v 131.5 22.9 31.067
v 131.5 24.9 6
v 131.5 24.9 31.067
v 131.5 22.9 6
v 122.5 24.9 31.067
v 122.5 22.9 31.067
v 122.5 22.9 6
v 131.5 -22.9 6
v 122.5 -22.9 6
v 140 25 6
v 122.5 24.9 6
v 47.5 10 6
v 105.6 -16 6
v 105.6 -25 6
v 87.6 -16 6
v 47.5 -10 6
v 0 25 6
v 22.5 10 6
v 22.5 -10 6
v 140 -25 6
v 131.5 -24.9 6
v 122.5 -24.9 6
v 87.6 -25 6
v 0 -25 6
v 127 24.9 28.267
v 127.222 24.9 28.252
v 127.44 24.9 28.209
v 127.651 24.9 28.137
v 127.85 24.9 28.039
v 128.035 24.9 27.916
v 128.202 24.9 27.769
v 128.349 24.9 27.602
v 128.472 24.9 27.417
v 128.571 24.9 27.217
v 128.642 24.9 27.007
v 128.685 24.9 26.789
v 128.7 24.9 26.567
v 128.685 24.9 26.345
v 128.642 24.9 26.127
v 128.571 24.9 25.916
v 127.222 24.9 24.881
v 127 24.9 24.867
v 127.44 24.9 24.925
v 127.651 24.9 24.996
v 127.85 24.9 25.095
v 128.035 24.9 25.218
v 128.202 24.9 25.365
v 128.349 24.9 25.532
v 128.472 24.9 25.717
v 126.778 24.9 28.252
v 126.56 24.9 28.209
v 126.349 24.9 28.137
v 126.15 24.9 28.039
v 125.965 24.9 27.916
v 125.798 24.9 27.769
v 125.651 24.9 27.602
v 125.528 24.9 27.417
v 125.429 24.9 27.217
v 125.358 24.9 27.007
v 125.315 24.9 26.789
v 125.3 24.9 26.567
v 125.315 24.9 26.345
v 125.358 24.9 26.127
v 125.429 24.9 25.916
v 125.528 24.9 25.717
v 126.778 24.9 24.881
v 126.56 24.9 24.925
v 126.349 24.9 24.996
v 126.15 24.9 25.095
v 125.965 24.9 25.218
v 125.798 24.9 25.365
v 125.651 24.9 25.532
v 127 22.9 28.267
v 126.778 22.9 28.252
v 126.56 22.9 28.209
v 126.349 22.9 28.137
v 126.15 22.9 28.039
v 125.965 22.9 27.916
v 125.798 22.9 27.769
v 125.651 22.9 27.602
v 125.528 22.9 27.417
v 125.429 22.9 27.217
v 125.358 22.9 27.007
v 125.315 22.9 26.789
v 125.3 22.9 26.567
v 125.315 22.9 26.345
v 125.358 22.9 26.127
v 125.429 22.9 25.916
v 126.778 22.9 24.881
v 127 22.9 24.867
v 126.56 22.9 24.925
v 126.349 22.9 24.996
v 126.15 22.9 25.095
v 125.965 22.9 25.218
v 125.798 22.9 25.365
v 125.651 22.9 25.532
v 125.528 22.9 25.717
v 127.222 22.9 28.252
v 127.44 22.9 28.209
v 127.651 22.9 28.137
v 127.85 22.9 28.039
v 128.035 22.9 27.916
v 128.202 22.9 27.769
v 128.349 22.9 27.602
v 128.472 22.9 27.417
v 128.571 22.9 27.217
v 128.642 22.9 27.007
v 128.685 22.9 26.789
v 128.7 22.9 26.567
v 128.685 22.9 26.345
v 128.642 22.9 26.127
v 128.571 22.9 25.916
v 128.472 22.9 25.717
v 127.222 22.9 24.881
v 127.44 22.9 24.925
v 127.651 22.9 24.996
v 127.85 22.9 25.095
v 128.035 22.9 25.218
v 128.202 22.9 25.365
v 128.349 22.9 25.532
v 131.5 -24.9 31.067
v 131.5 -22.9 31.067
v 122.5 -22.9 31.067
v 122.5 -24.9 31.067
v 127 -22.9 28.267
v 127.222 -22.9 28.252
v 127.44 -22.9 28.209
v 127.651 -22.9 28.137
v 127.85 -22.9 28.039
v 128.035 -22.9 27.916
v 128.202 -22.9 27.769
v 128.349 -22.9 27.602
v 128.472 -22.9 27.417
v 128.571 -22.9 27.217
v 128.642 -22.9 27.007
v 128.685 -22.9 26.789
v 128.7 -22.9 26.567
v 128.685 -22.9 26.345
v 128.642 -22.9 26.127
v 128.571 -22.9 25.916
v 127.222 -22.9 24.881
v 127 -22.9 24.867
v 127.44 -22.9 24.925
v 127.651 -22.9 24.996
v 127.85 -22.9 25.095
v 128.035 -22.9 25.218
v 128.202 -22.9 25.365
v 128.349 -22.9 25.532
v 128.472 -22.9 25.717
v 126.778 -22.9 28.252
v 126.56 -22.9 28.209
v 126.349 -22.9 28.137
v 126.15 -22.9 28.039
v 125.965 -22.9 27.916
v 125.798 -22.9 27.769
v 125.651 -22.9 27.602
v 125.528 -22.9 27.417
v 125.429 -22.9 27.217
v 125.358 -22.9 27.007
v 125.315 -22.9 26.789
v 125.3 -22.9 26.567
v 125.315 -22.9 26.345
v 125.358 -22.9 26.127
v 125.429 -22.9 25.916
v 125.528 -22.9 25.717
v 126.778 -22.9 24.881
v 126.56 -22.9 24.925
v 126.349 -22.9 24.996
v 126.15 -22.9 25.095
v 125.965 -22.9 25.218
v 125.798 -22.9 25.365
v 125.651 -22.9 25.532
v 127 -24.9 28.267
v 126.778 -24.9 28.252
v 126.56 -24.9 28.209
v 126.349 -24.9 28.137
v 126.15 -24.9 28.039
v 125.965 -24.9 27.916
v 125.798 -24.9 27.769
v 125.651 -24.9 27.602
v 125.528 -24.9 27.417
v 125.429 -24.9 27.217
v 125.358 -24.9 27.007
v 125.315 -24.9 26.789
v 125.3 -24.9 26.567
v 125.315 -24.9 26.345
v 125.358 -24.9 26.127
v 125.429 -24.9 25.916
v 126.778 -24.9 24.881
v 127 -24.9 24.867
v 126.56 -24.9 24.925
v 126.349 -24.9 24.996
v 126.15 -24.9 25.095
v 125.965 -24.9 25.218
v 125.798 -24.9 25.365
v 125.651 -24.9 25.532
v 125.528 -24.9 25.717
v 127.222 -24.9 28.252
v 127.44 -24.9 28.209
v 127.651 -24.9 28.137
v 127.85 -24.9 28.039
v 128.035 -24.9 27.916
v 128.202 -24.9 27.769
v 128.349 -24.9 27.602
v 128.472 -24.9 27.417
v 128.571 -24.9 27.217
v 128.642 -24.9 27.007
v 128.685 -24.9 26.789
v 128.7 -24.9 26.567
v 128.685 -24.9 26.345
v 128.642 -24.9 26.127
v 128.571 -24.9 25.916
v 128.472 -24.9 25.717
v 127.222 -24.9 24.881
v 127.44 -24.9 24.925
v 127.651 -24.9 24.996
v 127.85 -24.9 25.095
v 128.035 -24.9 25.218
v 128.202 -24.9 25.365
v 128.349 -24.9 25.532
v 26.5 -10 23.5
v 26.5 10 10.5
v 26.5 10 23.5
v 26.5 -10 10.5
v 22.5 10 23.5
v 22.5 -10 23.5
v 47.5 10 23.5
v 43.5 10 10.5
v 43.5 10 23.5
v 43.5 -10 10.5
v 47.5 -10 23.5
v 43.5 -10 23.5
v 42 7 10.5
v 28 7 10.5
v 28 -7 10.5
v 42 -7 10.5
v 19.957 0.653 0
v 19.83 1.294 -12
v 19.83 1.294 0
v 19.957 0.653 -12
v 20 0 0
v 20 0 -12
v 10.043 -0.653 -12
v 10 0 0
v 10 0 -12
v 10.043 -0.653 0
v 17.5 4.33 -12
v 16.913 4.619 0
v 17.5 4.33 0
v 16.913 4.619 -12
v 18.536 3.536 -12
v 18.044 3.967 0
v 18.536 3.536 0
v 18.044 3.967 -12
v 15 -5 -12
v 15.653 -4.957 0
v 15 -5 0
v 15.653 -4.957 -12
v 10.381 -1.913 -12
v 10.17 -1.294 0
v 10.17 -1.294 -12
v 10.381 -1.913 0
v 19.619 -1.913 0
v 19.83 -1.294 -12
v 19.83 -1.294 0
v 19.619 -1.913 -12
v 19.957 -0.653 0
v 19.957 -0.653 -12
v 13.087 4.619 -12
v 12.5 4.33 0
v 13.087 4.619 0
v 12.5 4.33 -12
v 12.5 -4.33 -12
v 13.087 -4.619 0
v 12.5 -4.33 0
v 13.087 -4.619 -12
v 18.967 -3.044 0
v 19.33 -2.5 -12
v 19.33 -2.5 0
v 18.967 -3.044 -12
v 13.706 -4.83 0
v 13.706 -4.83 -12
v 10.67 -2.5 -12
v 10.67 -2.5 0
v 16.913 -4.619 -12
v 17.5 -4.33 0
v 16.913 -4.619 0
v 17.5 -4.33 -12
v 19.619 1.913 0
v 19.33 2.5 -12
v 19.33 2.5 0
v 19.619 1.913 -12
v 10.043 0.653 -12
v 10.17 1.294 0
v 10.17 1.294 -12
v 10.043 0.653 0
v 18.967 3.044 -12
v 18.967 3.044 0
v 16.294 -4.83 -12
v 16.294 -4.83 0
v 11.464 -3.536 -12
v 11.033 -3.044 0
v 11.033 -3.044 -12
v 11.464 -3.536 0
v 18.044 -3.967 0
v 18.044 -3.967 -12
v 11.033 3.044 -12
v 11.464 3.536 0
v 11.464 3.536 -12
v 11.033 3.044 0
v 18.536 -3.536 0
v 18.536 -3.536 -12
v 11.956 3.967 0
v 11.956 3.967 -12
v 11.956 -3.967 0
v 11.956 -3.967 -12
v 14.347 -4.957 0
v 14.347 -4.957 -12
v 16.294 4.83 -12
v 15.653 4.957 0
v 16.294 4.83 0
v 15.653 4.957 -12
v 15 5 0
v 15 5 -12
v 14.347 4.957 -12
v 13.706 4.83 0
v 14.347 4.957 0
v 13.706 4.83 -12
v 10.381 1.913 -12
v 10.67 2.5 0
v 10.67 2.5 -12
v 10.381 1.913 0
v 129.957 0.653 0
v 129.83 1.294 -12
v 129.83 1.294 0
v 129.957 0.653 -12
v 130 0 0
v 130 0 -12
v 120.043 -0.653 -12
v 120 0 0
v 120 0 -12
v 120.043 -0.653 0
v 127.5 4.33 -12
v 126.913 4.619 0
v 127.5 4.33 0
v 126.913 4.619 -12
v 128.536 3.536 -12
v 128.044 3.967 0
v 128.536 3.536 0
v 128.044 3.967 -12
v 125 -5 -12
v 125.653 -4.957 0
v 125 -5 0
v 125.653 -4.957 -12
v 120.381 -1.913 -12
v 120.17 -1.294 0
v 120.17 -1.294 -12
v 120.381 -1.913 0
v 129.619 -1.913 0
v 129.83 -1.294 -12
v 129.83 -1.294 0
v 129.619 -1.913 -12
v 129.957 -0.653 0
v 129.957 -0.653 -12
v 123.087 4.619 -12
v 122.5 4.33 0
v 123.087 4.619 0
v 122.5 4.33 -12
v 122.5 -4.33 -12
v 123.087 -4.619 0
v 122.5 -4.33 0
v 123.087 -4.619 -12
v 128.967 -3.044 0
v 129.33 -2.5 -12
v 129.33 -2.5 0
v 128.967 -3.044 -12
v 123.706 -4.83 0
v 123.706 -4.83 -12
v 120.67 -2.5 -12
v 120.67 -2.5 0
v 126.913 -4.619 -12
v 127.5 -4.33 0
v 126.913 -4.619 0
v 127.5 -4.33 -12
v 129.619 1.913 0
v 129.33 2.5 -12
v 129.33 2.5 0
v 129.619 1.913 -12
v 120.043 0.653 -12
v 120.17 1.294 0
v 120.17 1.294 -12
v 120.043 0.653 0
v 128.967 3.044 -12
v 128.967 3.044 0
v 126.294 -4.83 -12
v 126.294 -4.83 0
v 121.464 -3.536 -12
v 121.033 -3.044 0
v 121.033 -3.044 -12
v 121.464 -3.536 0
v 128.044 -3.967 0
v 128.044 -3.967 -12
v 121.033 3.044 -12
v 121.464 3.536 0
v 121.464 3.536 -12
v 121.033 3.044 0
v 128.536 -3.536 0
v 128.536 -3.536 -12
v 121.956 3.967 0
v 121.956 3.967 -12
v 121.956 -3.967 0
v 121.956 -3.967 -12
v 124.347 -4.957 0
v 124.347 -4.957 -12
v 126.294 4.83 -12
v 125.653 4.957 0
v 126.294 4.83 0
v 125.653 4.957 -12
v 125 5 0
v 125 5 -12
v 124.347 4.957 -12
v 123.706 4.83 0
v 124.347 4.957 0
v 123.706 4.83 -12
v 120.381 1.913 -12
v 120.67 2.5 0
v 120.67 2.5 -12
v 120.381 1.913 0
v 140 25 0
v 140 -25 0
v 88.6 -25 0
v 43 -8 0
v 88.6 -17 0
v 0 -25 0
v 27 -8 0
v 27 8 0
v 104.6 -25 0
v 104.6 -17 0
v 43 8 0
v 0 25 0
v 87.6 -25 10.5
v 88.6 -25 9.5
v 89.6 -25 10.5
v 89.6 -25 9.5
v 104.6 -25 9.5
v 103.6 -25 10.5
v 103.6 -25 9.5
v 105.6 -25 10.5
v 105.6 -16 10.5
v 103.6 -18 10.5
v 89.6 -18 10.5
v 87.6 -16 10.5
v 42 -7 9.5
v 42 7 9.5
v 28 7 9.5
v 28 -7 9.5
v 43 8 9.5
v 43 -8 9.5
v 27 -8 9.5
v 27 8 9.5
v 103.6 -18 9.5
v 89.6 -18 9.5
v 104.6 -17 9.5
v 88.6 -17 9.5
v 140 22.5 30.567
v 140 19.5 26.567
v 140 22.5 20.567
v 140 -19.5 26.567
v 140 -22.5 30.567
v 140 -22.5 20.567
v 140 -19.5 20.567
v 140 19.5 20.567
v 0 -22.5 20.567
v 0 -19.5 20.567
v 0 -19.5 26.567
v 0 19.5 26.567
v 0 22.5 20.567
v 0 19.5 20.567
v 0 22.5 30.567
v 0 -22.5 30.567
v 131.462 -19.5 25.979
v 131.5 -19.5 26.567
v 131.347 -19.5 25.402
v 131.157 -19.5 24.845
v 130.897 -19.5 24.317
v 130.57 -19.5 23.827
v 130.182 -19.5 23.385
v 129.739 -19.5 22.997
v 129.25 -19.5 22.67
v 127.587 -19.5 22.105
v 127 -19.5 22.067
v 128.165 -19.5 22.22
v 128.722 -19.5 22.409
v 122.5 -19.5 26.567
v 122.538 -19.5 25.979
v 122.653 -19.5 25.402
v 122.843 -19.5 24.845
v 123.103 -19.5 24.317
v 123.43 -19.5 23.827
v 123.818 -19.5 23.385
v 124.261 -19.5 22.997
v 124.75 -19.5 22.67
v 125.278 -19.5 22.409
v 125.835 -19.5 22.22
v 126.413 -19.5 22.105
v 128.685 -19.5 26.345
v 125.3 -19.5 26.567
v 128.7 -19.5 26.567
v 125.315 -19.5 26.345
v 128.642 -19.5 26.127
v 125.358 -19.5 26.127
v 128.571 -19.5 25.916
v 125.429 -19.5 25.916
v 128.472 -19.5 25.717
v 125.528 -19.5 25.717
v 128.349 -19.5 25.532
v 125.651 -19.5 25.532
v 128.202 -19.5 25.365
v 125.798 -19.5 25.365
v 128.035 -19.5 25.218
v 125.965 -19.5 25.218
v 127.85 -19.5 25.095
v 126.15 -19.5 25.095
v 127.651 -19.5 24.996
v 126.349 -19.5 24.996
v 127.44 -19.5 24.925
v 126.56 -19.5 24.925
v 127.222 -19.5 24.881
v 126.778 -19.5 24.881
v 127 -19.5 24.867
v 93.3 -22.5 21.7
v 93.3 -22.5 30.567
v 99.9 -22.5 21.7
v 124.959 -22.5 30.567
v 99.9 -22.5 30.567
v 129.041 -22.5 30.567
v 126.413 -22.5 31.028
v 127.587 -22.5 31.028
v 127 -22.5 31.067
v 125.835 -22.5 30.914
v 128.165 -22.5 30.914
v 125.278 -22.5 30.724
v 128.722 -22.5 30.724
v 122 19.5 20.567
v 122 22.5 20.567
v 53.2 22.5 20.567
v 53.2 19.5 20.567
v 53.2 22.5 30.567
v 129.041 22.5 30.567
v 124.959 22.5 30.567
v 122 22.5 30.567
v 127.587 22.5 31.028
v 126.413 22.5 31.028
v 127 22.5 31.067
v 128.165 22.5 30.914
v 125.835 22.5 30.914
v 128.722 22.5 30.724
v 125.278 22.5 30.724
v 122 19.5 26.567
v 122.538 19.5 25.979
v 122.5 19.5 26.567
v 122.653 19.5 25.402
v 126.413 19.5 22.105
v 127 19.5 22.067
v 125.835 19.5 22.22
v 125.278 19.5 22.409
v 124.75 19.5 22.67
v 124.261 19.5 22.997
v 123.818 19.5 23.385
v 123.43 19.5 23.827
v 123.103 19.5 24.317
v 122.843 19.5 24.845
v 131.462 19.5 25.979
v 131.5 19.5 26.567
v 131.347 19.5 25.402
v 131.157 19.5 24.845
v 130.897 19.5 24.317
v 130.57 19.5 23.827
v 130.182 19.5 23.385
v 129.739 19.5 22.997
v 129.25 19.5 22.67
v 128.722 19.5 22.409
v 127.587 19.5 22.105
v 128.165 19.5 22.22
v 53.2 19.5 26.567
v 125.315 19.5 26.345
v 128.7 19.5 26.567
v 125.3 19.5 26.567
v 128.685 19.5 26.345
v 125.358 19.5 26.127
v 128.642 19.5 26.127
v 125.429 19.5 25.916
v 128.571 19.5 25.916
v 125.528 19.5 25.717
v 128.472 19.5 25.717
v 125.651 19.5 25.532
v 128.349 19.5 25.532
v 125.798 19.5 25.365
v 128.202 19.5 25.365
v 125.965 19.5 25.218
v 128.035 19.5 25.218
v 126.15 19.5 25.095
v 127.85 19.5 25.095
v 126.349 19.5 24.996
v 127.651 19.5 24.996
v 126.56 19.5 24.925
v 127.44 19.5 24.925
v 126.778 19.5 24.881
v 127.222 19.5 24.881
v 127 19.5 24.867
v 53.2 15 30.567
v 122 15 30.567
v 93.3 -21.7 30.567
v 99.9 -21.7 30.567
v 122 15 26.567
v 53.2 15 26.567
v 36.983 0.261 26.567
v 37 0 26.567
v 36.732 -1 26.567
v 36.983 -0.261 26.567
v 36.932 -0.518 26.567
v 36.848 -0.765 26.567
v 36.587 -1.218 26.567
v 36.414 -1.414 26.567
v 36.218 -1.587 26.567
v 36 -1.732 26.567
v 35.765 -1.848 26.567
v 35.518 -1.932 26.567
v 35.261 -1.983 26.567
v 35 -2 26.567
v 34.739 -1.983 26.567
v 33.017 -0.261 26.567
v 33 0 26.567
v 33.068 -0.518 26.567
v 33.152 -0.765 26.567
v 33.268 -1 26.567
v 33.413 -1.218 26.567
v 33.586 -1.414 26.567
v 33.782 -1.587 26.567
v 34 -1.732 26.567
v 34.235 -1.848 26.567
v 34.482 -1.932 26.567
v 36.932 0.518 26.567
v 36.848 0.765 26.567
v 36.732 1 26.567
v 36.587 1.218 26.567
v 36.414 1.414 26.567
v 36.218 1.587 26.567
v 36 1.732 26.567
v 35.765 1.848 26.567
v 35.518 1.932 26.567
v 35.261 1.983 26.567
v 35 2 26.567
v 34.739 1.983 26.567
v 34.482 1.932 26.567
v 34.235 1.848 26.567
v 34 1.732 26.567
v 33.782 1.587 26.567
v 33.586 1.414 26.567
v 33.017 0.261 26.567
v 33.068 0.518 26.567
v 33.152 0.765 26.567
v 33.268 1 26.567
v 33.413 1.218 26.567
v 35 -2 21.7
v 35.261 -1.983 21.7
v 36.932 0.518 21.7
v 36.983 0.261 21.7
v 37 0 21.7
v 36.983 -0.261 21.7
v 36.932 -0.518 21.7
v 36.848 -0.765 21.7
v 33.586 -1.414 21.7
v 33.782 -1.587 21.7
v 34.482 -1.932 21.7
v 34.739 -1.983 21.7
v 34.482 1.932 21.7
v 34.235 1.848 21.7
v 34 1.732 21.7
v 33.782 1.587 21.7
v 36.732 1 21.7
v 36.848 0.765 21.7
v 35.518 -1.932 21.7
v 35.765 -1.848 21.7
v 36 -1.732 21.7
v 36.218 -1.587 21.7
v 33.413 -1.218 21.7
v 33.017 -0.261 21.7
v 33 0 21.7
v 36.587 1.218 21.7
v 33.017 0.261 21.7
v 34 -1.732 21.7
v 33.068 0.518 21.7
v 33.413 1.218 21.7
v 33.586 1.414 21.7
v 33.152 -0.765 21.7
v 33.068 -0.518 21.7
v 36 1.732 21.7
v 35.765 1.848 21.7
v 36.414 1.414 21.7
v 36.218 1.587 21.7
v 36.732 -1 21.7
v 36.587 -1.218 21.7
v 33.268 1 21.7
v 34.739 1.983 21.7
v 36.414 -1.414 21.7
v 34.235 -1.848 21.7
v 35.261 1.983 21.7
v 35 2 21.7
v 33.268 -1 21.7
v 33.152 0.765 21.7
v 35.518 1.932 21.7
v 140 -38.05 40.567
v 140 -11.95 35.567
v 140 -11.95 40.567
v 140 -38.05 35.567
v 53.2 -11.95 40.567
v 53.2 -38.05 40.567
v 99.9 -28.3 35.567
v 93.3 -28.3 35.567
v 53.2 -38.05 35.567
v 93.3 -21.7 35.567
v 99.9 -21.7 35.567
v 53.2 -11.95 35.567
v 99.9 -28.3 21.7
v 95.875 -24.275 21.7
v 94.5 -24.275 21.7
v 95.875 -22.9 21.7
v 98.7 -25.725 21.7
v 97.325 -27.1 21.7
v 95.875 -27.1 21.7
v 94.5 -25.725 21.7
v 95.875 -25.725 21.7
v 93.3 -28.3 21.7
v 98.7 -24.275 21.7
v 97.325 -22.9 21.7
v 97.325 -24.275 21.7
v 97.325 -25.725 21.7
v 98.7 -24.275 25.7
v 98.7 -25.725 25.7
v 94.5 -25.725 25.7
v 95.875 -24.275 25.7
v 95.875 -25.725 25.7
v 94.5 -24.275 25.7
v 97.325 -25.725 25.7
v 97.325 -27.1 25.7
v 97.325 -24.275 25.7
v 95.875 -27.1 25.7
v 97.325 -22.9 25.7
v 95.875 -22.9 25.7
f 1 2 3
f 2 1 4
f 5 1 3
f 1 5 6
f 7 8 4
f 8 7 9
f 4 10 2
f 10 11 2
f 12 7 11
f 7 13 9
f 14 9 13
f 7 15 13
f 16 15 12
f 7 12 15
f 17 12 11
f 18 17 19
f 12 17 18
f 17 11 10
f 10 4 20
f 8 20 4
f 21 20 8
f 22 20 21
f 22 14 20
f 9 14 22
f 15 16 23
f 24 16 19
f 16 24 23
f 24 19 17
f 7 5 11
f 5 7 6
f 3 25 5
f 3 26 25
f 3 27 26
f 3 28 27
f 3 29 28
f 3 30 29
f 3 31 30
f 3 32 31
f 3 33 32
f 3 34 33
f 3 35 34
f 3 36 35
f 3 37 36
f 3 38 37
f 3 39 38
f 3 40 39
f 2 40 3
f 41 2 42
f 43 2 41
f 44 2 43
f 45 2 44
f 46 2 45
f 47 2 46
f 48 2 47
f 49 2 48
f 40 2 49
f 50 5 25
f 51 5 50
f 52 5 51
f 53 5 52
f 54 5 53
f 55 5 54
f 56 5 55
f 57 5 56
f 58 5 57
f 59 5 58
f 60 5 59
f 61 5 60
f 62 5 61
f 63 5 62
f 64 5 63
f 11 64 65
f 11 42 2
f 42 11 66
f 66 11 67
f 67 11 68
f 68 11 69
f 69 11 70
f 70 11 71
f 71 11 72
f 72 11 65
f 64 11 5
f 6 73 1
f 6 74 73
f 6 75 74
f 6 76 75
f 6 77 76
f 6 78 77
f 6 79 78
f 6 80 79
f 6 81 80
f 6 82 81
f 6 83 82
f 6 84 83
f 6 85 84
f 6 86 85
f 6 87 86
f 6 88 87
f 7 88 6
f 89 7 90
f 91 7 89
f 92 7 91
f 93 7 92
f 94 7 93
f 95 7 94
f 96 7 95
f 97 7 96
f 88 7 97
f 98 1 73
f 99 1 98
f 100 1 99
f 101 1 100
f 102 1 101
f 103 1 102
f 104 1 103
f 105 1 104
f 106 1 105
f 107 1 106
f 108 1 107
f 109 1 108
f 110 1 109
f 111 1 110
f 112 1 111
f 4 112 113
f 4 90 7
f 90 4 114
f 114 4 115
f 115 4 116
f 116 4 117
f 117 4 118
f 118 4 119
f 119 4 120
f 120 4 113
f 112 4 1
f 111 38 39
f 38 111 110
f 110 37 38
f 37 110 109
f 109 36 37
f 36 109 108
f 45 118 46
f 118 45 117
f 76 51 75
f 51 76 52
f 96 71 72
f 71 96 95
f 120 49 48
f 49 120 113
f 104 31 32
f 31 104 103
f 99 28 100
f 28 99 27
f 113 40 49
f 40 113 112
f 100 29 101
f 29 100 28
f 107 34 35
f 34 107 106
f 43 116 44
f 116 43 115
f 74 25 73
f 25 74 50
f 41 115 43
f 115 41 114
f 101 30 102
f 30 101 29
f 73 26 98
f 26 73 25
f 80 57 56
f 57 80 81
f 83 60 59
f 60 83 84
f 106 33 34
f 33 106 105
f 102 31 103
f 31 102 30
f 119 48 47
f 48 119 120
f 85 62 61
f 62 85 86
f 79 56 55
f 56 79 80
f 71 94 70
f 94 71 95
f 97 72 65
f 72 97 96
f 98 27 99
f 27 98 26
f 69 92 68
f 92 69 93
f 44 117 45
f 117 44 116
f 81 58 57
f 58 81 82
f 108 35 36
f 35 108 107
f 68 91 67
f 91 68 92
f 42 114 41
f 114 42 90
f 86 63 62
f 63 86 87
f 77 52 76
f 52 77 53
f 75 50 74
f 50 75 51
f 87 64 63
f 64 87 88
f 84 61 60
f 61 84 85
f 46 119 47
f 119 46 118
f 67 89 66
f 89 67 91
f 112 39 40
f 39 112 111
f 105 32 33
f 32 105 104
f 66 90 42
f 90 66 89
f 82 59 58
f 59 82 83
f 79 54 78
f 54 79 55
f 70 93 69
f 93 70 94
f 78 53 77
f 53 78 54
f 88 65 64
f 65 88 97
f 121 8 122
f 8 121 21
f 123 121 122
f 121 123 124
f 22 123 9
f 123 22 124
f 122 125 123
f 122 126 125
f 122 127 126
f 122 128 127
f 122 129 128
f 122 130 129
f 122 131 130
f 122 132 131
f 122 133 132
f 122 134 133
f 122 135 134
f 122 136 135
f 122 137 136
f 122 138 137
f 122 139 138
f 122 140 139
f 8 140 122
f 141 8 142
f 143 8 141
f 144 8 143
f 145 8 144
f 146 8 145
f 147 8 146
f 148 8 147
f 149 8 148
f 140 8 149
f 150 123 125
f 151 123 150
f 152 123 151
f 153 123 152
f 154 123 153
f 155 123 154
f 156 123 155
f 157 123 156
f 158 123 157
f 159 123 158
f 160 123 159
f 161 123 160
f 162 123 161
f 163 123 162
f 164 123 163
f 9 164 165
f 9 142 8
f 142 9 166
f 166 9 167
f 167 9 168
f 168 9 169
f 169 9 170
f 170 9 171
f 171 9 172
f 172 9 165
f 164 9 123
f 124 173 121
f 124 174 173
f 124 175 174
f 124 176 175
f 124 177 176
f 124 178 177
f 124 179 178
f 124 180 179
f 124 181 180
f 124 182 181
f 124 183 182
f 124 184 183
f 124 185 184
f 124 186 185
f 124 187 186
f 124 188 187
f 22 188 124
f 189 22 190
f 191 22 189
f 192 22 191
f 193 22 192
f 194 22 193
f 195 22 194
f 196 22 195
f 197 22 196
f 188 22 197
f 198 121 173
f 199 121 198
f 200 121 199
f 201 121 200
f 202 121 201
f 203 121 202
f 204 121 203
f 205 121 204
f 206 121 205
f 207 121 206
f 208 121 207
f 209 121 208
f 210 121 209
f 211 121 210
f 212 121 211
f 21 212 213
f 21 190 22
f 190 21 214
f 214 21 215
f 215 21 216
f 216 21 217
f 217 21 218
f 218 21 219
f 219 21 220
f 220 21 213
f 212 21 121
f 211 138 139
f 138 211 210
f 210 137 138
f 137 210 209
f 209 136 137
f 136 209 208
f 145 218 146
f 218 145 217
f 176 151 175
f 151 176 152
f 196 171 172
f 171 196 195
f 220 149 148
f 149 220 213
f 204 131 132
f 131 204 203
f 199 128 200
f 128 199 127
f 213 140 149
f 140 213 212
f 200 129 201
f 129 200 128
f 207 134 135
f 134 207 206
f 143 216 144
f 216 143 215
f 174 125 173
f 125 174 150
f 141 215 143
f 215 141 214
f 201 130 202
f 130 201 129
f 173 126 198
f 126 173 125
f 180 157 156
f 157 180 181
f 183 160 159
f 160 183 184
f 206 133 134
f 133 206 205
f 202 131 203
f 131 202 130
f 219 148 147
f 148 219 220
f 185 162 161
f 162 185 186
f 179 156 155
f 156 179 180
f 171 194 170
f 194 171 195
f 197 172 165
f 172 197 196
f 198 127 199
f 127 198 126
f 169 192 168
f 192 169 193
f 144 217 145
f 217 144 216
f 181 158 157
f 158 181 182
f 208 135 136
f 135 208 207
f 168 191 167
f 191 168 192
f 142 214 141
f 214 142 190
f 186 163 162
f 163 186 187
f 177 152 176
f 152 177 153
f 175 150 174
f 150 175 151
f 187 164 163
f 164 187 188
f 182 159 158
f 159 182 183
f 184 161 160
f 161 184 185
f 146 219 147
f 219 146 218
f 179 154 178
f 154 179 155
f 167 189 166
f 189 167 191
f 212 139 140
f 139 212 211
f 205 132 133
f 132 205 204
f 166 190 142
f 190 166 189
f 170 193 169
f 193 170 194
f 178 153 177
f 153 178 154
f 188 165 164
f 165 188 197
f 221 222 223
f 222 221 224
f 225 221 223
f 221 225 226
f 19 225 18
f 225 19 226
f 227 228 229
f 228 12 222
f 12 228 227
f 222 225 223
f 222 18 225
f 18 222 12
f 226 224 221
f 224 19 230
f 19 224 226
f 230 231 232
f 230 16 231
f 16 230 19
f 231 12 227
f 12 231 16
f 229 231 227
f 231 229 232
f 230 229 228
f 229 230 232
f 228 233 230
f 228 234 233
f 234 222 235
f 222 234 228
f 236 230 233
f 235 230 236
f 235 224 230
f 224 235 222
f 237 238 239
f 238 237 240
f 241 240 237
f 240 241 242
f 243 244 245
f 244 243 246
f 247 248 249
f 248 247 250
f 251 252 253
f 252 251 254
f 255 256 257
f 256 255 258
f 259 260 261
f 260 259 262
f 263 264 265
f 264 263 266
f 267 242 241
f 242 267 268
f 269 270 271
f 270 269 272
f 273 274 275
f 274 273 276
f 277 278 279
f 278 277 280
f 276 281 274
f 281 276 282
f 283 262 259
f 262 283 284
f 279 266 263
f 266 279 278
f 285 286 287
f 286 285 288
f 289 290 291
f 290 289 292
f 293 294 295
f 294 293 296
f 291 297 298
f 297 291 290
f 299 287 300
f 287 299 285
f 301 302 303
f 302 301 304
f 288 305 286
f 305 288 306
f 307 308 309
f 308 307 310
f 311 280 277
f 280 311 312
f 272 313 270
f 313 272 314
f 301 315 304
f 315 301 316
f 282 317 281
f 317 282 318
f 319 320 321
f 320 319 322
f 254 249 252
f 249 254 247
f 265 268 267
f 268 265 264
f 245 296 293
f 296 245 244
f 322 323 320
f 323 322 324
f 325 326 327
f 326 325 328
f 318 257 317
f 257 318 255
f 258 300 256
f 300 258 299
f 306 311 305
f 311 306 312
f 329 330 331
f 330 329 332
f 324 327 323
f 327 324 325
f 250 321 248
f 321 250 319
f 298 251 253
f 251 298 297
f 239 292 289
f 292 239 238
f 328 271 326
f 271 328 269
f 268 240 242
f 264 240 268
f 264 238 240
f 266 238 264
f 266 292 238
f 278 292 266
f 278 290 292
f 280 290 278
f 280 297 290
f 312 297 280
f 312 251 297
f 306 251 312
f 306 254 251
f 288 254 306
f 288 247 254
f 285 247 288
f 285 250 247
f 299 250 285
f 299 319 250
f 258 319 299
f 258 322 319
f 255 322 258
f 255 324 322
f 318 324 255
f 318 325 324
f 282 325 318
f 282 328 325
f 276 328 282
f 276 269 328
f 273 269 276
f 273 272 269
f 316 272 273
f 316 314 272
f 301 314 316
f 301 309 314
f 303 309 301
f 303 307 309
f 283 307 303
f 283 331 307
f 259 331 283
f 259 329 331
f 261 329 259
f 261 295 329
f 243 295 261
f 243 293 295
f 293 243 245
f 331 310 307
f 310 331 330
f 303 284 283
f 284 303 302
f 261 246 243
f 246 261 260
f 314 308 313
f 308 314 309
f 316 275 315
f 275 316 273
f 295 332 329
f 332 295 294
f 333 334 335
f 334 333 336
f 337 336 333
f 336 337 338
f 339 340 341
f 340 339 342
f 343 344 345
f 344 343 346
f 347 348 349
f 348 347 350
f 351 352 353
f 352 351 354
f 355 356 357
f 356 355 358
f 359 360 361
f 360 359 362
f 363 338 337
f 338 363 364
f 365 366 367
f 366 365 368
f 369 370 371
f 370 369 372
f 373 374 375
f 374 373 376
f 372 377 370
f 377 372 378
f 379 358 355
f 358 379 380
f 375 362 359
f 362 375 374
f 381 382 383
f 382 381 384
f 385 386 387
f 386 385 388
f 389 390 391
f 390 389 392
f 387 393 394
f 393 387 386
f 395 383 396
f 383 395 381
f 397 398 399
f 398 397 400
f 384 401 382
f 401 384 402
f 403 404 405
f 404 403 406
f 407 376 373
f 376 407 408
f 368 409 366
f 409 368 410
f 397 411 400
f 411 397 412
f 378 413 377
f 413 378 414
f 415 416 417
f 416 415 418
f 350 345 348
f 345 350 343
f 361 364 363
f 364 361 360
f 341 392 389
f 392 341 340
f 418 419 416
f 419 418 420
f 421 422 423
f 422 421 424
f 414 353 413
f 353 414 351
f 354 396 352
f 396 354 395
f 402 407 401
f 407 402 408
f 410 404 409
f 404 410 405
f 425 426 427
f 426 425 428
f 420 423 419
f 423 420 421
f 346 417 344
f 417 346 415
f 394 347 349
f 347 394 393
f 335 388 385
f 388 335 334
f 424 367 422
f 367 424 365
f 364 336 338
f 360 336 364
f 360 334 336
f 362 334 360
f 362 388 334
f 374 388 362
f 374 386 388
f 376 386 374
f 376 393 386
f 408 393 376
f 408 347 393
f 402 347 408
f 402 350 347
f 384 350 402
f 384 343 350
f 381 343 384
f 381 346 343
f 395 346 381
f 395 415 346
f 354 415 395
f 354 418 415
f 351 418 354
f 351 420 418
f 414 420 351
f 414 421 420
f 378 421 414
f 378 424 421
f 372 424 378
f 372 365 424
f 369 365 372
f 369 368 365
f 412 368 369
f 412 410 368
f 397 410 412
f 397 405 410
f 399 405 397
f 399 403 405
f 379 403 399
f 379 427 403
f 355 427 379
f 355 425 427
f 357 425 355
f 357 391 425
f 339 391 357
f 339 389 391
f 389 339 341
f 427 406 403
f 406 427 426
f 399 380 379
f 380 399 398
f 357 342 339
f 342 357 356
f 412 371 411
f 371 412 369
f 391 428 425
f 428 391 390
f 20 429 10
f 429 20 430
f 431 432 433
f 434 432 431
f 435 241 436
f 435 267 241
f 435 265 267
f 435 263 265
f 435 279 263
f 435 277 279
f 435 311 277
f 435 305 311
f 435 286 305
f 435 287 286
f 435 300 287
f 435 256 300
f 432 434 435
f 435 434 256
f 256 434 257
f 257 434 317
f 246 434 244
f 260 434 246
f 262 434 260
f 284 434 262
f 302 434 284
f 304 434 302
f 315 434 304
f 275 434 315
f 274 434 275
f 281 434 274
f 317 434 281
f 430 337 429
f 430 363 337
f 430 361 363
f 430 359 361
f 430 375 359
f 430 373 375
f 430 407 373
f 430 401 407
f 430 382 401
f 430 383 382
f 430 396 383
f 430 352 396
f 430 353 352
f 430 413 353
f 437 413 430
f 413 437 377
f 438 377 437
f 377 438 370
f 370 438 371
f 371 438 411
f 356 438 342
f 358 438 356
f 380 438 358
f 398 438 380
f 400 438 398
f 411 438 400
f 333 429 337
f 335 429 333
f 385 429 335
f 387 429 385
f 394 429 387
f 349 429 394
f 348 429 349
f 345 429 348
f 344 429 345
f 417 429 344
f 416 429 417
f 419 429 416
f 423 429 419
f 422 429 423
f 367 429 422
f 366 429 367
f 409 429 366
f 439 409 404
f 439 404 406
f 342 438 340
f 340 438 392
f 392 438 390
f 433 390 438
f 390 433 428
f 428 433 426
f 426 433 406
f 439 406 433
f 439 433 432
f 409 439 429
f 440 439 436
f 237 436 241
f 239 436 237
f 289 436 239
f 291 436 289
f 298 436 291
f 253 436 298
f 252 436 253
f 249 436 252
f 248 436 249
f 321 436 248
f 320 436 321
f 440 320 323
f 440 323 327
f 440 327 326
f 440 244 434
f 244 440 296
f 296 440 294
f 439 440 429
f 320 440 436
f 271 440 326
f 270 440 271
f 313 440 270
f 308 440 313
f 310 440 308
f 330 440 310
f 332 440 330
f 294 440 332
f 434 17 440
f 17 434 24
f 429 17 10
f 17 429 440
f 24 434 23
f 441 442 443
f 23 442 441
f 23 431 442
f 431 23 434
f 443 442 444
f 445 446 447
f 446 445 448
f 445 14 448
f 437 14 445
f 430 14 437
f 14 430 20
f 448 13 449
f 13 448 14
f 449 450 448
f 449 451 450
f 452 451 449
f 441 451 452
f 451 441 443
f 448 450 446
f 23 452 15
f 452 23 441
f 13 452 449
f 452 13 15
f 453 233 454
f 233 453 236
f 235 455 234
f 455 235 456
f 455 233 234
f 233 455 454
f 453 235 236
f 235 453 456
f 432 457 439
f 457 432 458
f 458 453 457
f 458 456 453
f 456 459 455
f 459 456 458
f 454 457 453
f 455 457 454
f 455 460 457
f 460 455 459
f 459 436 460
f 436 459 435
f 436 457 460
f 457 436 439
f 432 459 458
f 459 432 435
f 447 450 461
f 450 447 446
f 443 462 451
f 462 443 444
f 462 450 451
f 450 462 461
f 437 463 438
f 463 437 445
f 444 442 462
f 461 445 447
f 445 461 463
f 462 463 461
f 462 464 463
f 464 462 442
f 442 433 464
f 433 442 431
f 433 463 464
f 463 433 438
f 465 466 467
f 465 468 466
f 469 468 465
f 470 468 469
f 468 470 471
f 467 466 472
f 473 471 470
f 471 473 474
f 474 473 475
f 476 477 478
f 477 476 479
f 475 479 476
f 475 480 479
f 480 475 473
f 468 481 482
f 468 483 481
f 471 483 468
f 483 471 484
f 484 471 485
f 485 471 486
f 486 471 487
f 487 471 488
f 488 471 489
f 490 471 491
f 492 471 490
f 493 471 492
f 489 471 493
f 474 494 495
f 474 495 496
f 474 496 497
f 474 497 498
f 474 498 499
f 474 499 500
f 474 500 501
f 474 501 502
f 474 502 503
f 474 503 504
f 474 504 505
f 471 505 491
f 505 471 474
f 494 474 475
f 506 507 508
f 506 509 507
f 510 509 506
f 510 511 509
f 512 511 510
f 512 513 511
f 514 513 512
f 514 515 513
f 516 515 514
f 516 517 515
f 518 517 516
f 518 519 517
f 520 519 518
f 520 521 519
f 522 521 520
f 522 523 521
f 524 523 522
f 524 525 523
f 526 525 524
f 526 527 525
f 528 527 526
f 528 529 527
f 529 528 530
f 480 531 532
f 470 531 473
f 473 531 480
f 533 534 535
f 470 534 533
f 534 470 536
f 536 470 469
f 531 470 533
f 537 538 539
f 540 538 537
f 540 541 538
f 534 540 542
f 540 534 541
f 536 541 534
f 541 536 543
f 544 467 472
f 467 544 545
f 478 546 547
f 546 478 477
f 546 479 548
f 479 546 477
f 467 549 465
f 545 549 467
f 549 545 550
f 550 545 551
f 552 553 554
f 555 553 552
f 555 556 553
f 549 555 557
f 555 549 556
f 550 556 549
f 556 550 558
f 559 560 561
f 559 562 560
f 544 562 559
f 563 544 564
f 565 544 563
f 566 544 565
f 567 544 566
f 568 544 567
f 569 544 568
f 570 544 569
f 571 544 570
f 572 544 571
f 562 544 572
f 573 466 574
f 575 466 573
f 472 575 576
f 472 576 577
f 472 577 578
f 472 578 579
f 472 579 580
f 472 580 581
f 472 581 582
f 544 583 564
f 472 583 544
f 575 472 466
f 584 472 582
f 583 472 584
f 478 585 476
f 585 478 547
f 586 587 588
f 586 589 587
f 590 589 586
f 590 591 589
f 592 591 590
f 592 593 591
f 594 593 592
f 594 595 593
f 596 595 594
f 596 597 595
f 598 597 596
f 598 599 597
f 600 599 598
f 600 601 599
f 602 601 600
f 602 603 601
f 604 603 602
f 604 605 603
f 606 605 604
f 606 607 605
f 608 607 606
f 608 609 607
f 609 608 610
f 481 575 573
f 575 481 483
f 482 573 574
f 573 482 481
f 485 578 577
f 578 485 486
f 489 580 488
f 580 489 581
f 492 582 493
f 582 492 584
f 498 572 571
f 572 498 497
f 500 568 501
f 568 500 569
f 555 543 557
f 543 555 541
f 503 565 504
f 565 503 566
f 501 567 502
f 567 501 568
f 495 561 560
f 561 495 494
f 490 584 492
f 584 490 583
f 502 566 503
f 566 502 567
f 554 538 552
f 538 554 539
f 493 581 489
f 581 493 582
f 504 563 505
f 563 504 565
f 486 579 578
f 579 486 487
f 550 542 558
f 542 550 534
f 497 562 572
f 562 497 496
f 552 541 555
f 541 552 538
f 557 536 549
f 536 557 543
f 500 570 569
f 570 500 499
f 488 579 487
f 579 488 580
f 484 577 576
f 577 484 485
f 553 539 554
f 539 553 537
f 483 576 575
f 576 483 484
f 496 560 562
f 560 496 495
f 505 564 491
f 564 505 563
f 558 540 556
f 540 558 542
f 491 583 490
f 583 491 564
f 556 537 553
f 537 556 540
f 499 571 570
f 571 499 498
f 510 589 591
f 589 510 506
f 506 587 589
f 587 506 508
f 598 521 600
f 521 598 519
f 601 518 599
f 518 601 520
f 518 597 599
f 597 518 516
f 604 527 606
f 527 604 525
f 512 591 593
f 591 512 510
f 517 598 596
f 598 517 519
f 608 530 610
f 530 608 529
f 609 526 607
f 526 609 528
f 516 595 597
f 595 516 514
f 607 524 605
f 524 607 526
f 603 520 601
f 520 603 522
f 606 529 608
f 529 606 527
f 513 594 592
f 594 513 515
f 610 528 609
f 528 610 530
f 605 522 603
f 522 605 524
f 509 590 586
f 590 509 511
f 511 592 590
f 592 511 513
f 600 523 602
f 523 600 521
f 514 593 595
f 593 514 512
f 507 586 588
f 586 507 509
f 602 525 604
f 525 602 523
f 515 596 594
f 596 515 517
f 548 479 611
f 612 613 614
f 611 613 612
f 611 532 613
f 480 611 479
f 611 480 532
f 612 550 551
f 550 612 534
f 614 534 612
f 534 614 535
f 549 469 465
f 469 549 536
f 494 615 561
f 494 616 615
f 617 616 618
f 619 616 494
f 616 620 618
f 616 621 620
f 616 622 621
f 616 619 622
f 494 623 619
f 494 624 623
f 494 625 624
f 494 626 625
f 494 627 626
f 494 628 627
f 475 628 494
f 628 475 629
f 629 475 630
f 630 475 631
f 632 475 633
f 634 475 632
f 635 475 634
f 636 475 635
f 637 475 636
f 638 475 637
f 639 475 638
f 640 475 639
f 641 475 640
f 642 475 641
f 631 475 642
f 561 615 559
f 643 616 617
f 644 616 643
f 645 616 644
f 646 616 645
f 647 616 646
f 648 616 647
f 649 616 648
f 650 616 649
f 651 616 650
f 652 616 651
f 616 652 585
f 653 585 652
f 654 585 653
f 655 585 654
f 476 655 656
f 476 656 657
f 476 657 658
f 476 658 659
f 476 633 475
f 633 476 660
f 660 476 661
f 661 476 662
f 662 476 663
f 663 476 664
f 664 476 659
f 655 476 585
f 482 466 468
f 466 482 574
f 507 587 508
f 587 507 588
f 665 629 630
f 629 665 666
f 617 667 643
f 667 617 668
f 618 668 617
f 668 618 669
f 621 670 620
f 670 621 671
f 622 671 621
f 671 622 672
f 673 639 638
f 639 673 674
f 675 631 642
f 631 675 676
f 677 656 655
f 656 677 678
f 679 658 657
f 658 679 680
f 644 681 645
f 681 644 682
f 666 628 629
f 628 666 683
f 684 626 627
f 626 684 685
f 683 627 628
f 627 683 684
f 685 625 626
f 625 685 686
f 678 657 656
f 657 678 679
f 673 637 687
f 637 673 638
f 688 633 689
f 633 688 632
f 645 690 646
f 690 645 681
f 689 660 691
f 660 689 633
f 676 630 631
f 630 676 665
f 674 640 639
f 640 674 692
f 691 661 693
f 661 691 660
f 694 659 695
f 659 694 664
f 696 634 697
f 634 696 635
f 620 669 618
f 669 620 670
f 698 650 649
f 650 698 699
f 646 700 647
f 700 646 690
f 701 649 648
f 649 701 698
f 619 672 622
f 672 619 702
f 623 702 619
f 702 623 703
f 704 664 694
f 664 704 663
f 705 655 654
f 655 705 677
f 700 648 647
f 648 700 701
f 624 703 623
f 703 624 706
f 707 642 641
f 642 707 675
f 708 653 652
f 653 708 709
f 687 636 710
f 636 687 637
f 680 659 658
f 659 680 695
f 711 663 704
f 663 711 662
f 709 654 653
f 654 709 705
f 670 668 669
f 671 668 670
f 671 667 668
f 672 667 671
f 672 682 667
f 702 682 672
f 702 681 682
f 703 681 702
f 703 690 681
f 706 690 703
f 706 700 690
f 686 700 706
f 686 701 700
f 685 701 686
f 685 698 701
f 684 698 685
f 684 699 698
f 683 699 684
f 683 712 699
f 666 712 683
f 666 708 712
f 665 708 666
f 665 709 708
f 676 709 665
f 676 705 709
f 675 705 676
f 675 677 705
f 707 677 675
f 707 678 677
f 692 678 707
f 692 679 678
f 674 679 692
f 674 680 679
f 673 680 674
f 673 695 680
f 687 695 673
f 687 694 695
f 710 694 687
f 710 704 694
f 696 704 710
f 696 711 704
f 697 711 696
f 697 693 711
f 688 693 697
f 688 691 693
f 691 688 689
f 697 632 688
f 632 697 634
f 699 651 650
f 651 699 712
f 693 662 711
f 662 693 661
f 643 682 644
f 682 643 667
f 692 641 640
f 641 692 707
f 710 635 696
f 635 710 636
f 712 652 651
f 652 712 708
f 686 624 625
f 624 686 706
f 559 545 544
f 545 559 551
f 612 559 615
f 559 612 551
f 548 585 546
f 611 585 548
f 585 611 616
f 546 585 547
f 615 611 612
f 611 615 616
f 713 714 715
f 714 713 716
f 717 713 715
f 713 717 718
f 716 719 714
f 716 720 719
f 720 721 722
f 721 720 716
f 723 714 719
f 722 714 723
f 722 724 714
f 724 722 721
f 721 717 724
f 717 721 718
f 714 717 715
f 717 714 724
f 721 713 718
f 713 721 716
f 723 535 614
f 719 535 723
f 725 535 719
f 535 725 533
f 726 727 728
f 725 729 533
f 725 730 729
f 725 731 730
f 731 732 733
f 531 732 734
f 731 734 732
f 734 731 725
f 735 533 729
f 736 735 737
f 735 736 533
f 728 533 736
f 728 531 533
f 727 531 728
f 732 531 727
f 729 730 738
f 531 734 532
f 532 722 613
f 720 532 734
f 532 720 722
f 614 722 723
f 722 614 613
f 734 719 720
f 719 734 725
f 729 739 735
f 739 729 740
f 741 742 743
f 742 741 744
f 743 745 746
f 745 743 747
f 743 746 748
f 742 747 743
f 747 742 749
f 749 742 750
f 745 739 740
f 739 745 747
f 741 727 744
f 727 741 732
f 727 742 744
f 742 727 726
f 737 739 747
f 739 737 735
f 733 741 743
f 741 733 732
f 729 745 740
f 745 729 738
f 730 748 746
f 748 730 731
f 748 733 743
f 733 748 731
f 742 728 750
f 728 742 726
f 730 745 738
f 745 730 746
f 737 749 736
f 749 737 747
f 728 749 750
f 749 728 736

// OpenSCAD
// file: piano_keys.scad
// =====================================================================
// piano_keys.scad — the moving parts, PRINTED IN BOTH ROUTES
// =====================================================================
// Everything in this file is 3D printed and is needed whichever base you
// build. Nothing here is laser-cut.
//
//   mode "key"    key lever  x11
//   mode "black"  black key  x7
//
// The base comes from ONE of:
//   piano_base_printed.scad   all-printed route
//   piano_base_laser.scad     laser-cut route
//
// Shared dimensions live in piano_params.scad — edit them there.
// See ../TECHSPARK_PLAN.md for the full parts manifest.
//
// MECHANISM (side view, front = left):
//
//        finger presses here (contact_x)
//                |
//   ___________  v  ______________________ () <- rear pin hinge
//  |  key cap (lever, pivots at rear)      |
//  |______________________________________|
//                |plunger|
//                v
//             [MX switch] <- its own spring holds the key up and returns it
//  ============= base ====================
//
// The key RESTS on the switch stem. The finger drives the cap down; the stem
// actuates, and shortly after the cap lands on the base's stop shoulders.
// Those shoulders — not the switch — absorb the 362-520 gf overshoot.
// There is NO separate return spring and no up-stop: the MX spring does both.
//
// COORDINATES: x along the key (0 = front, +x = rear/hinge); y across the
// width (0 = centre); z up (0 = board underside).
// =====================================================================

include <piano_params.scad>

$fn = 48;

// =====================================================================
// Key lever (the moving key cap). Printing it upside-down is easiest.
// =====================================================================
// `idx` is the white-key index 0..10. It decides which sides get notched to
// clear the neighbouring black keys' switches. Pass -1 for an un-notched key.
module key_lever(idx = -1) {
    difference() {
        union() {
            // top plate
            translate([0, -key_w/2, under_rest]) cube([key_len, key_w, cap_th]);
            // side rails (cosmetic skirts) — INSIDE the key width so they clear
            // the hinge posts and the neighbouring key
            for (s = [-1, 1])
                translate([0, (s > 0) ? (key_w/2 - side_rail) : -key_w/2, under_rest - 6])
                    cube([key_len, side_rail, 6 + 0.1]);
            // rear hinge knuckle, centred in y, pin axis along Y
            translate([pivot_x, 0, pivot_z]) knuckle();
            // plunger at contact_x: presses the MX stem (no spring — MX returns it)
            translate([contact_x, 0, 0]) plunger();
        }
        // Notch the rear of the key wherever a black key sits beside it, so its
        // switch has room. Real piano white keys are shaped the same way, and
        // for the same reason. The notch stops at blk_notch_x1 so the hinge
        // knuckle keeps its full width.
        if (is_black(idx))     notch( 1);
        if (is_black(idx - 1)) notch(-1);
    }
}

module notch(side) {
    y0 = (side > 0) ? (key_w/2 - blk_notch) : -(key_w/2);
    translate([blk_notch_x0, y0, under_rest - 8])
        cube([blk_notch_x1 - blk_notch_x0, blk_notch, cap_th + 10]);
}

// Hinge knuckle. Origin is the PIN CENTRE, so it is called with
// translate([pivot_x, 0, pivot_z]). A bar lying along Y with the pin bore
// through it, merging into the cap above. It does NOT reach down to the base —
// the key has to swing freely. Its width (knuckle_wid) is what stops the key
// sliding sideways along the pin.
module knuckle() {
    difference() {
        translate([0, -knuckle_wid/2, 0])
            rotate([-90, 0, 0]) cylinder(h = knuckle_wid, d = knuckle_boss_d);
        translate([0, -knuckle_wid/2 - 1, 0])
            rotate([-90, 0, 0]) cylinder(h = knuckle_wid + 2, d = pin_d);
    }
}

module plunger() {
    // Stubby post hanging from the cap underside that pushes the MX stem down.
    // It passes between the base's stop shoulders; the CAP UNDERSIDE is what
    // lands on them, so the switch never takes the overshoot.
    tip_d = 4;
    translate([0, 0, under_rest - plunger_len])
        cylinder(h = plunger_len, d = tip_d);
}

// =====================================================================
// Black key (decorative riser, no switch). Sits at a white-key boundary:
// a thin web drops into the base's slot/groove and is glued; the cap
// overhangs both neighbouring white keys, black_rise above their tops.
// White keys only travel DOWN, so the overhang never collides.
// Print flat on its side for strength along the web.
// =====================================================================
// A SWITCHED black key: a keycap on a post that pushes straight onto an MX
// stem, exactly like a keyboard keycap. No hinge, no glue, no return spring —
// the switch supplies the travel and the spring.
//
// It travels straight down while the white keys pivot. Slightly different feel,
// but the black keys are never pressed by the robot, and a lever here would
// collide with the hinge brackets that share the same 5 mm gap.
module black_key() {
    cap_under = black_top_z - blk_cap_th;
    post_w    = mx_mount_cross + 2.4;      // socket plus wall
    difference() {
        union() {
            // cap
            translate([key_len - black_len, -black_w/2, cap_under])
                cube([black_len, black_w, blk_cap_th]);
            // post down to the switch stem, centred on blk_switch_x
            translate([blk_switch_x - post_w/2, -post_w/2, stem_top_z])
                cube([post_w, post_w, cap_under - stem_top_z + 0.1]);
        }
        // MX cross socket in the underside of the post
        translate([blk_switch_x, 0, stem_top_z - 0.1]) mx_mount();
    }
}

// The + shaped recess an MX stem plugs into.
module mx_mount() {
    for (r = [0, 90])
        rotate([0, 0, r])
            translate([-mx_mount_cross/2, -mx_mount_th/2, 0])
                cube([mx_mount_cross, mx_mount_th, mx_mount_depth + 0.1]);
}

// =====================================================================
// Render selector
// =====================================================================
// "key"    one key lever   (print 11)
// "black"  one black key   (print 7)
// "pair"   both together, to check the black key clears the white key
mode = "pair";

if      (mode == "key")   key_lever();
else if (mode == "black") black_key();
else if (mode == "pair") {
    color("white") key_lever();
    color("black") translate([0, pitch/2, 0]) black_key();
}
// main file
// =====================================================================
// piano_base_printed.scad — the ALL-PRINTED route for the keybed base
// =====================================================================
// One of two alternative bases. Everything here is 3D printed.
//
//   mode "base"   one 50 mm base cell
//   mode "tile"   one printable tile (set tile_i = 0/1/2)  -> print all 3
//   mode "full"   the whole 11-key board, VISUAL CHECK ONLY (too big to print)
//
// You ALSO need the key levers and black keys from piano_keys.scad — they are
// printed in both routes and are not duplicated here.
//
// BUILD VOLUME: TechSpark's printers are 10 x 10 x 10 in (254 mm) but the board
// is 545 mm wide, so the base must be split into 3 tiles (5 + 4 + 2 cells) and
// joined. The 50 mm key pitch therefore has to survive two seams — which is the
// main argument for the laser route in piano_base_laser.scad, where all 11
// switch holes are cut in one operation on one sheet.
//
// Shared dimensions live in piano_params.scad. See ../TECHSPARK_PLAN.md.
// =====================================================================

include <piano_params.scad>
use     <piano_keys.scad>      // key_lever() / black_key() for the preview modes

$fn = 48;

// =====================================================================
// Tiling — where the board is cut for the 254 mm print bed
// =====================================================================
// The 11 cells are printed as 3 tiles. WHICH cells each tile holds is not
// arbitrary: a seam must not fall on a black-key boundary, because the black
// key's switch socket straddles the boundary and would end up half on each
// tile, with the glue joint running straight through the 14 mm mounting hole
// that the MX clips grip.
//
// Black keys sit at boundaries after cells [0, 2, 3, 5, 6, 7, 9], so the only
// seam-safe boundaries are after cells 1, 4, 8 and 10. With a 5-cell (250 mm)
// tile limit, "after 4" and "after 8" is the ONLY 3-way split that works:
//
//   tile 0 -> cells 0..4   (5 cells, 250 mm)
//   tile 1 -> cells 5..8   (4 cells, 200 mm)
//   tile 2 -> cells 9..10  (2 cells, 100 mm)
//
// The previous 5 + 5 + 1 split put a seam after cell 9, which IS a black-key
// boundary.
tile_first = [0, 5, 9];              // first cell index of each tile
tile_last  = [4, 8, 10];             // last  cell index of each tile
seam_after = [4, 8];                 // a seam falls between cell s and s+1

// Feet live on the FIRST and LAST cell of each tile, so every tile stands on
// its own on the bench before the three are joined, and the finished board is
// supported at both ends of each span. Every cell used to carry a pair — 22
// feet on a 545 mm board, one every 25 mm, which is far more support than a
// plate this short needs and a lot of extra print time.
foot_cells = concat(tile_first, tile_last);   // 12 feet, was 22

function in_list(v, L) = len([for (e = L) if (e == v) 1]) > 0;

// =====================================================================
// Base cell (one 50 mm-wide slice of keybed). Tile in -y (see slot_y).
// =====================================================================
// `idx` is the white-key index (0..10) this cell holds. It decides which of the
// cell's two edges carries half of a black key's switch socket, whether the
// cell gets feet, and whether its edges are at a tile seam. Pass -1 for a plain
// cell with no black-key features.
//
// SIDE CONVENTION: slot_y() DECREASES with the index, so cell idx+1 is the -y
// neighbour of cell idx. is_black(idx) — the boundary between idx and idx+1 —
// is therefore at -pitch/2, and is_black(idx-1) is at +pitch/2. These were
// swapped, which put every black key's switch socket one boundary off.
//
// STRUCTURE: every subtraction happens in the ONE difference() below, and the
// modules in the union() are solid. mx_socket() and black_socket() used to
// carry their own nested difference(), which made the CSG tree needlessly deep
// and scattered the cuts across three places. (The reason the switch holes
// previewed as solid floors is in switch_cuts() — coincident cut faces, not
// the nesting — but keeping the cuts together is what makes that easy to see.)
module base_cell(idx = -1) {
    difference() {
        union() {
            translate([0, -pitch/2, 0]) cube([key_len, pitch, base_th]);
            hinge_post(1);
            hinge_post(-1);
            translate([contact_x, 0, base_th]) mx_boss();
            // Half of each neighbouring black key's switch boss. Clipped to
            // this cell so a tile edge stays flat: the other half is grown by
            // the neighbouring cell, and two butted cells form the whole boss.
            if (is_black(idx))      black_half_boss(-1);
            if (is_black(idx - 1))  black_half_boss( 1);
            if (in_list(idx, foot_cells)) cell_feet();
        }
        // ---- white key switch -------------------------------------------
        // The plate cutout, the clip relief under it, and a clearance hole
        // right THROUGH the base: the switch body and pins hang
        // mx_below_plate (6.4 mm) under the plate, more than fits inside the
        // riser. The pins end up in free air, the wires are soldered from
        // underneath, and the harness runs out to the Arduino in the space
        // the feet create.
        translate([contact_x, 0, base_th]) mx_cuts();
        // ---- black key switches -----------------------------------------
        // Switched, not decorative, so each needs the same cavity as a white
        // key rather than a groove to be glued into. Half falls in each
        // neighbouring cell.
        if (is_black(idx))      translate([0, -pitch/2, base_th]) black_cuts();
        if (is_black(idx - 1))  translate([0,  pitch/2, base_th]) black_cuts();
        // ---- tile registration ------------------------------------------
        if (in_list(idx,     seam_after)) translate([0, -pitch/2, 0]) dowel_holes();
        if (in_list(idx - 1, seam_after)) translate([0,  pitch/2, 0]) dowel_holes();
    }
}

// Integral feet, one pair per cell that carries them (see foot_cells). They
// lift the board by foot_h so the switch pins (which hang mx_below_plate under
// the plate) clear the desk and the wiring harness has somewhere to run.
// Printed as part of the cell — no standoffs to buy and nothing to align.
module cell_feet() {
    for (x = [15, 125])
        translate([x, 0, -foot_h]) cylinder(h = foot_h + 0.1, d = 10);
}

// Half-holes on a cell edge, cut ONLY where a tile seam falls (seam_after).
// The two halves form one bore across the joint, and a length of the same 3 mm
// rod used for the hinge pins registers the tiles to each other.
//
// This matters specifically for the printed route: the board is split into 3
// tiles for the 254 mm print bed, so the 50 mm key pitch — the thing the arm
// is calibrated to — has to survive two joins. Butting the tiles by eye would
// put that at risk; a dowel makes the joint repeatable.
//
// They used to be cut on EVERY cell edge, which put 44 blind holes through the
// base plate, 40 of them inside a tile where there is no joint to register and
// nothing to put in them.
module dowel_holes() {
    // x positions clear of the switch cavity (25-45), the black key socket
    // (87.6-105.6) and the hinge posts (122.5-131.5)
    for (x = [12, 137])
        translate([x, 0, -1]) cylinder(h = base_th + 2, d = pin_d);
}

// Physical y of key index i. Mirrored so key 0 lands at HIGH y, which is the
// viewer's LEFT when standing at the front — matching how the simulator draws
// it. See the orientation note at the top of piano_params.scad.
function slot_y(i) = (n_keys - 1 - i) * pitch;

// ---------------------------------------------------------------------
// Black key switch. SOLID and CUT are separate modules so base_cell() can do
// all of its subtraction at one level — see the note on base_cell().
// ---------------------------------------------------------------------
// blk_boss is 18 mm, not the white keys' 20 mm: it has to fit between the two
// notched white keys either side of it. A notched key edge sits
// key_w/2 - blk_notch = 15 mm from the cell centre, i.e. 10 mm from the
// boundary the boss is centred on, so a half-boss of 9 mm leaves 1 mm of
// clearance per side. At the old 19 mm that was only 0.5 mm, which print
// tolerance alone could close.
blk_boss = mx_cut + 2*2;    // 18

// Half of a black key's boss — the half lying inside THIS cell.
// side = -1 for the boss on the cell's -y edge, +1 for the +y edge.
module black_half_boss(side) {
    y0 = (side > 0) ? (pitch/2 - blk_boss/2) : -pitch/2;
    translate([blk_switch_x - blk_boss/2, y0, base_th])
        cube([blk_boss, blk_boss/2, mx_riser_h]);
}

// Everything removed at a black key switch. Same 14 mm plate cutout as the
// white keys, but NO stop shoulders: black keys are hand-pressed, so bottoming
// out on the switch is ordinary keyboard use. Origin on the key boundary at
// the TOP OF THE BASE PLATE, so it is called translated to (0, +/-pitch/2,
// base_th) — the same frame mx_cuts() uses.
module black_cuts() { switch_cuts(blk_switch_x); }

// The cut stack shared by every switch position, in TWO tiers:
//
//   mx_cut     14 mm  the plate the clips grip — the one accuracy-critical
//                     dimension, and the only place the bore is this tight
//   mx_cut + 2 16 mm  everything below it, in one cube: the relief that lets
//                     the clips spring out and latch, carried straight on
//                     through the base plate so the body and pins hang in
//                     free air, the wires are soldered from underneath, and
//                     the harness runs out to the Arduino under the board
//
// Origin at (0, 0, base_th) — z = 0 is the TOP of the base plate.
//
// This used to be three tiers, with the through-base hole widened to 17 mm.
// That extra millimetre bought nothing (16 mm already clears the 13.95 mm
// body) and left a 0.5 mm ring of wall at the bottom of the 18 mm black key
// boss, too thin to print. Two tiers leave 1 mm there and 2 mm at the white
// keys' 20 mm boss.
//
// The tiers OVERLAP in z by ov rather than meeting face to face. Two
// subtracted volumes that share a plane exactly give OpenSCAD's F5 preview
// coincident surfaces to z-fight over, and the artifact reads as a solid floor
// across the hole — which is what made these holes look like blind pockets on
// screen. F6 cut them correctly the whole time, but the preview is what
// anyone actually looks at.
module switch_cuts(x) {
    ov      = 0.5;
    plate_z = mx_riser_h - mx_plate_th;    // 3 — underside of the plate
    translate([x - mx_cut/2, -mx_cut/2, plate_z])
        cube([mx_cut, mx_cut, mx_plate_th + 1]);
    translate([x - (mx_cut + 2)/2, -(mx_cut + 2)/2, -base_th - 1])
        cube([mx_cut + 2, mx_cut + 2, base_th + 1 + plate_z + ov]);
}

// One hinge post. side = +1 / -1 puts it just outside the key cap, inside the
// 5 mm inter-key gap, so the moving key never touches it. The pin bore runs
// along Y — ACROSS the keys — so the key pivots up and down.
module hinge_post(side) {
    y0 = (side > 0) ? (key_w/2 + clr) : -(key_w/2 + clr + post_w);
    difference() {
        translate([pivot_x - post_len/2, y0, base_th])
            cube([post_len, post_w, pivot_z - base_th + post_len/2]);
        translate([pivot_x, y0 - 1, pivot_z])
            rotate([-90, 0, 0]) cylinder(h = post_w + 2, d = pin_d);
    }
}

// White key MX socket, SOLID half: a riser carrying the plate, with integral
// shoulders rising to stop_top. Those shoulders are the hard bottom stop, so
// the finger's overshoot lands on the frame rather than the switch.
// Origin at (contact_x, 0, base_th). The holes are cut by mx_cuts(), called
// with the same translate — see the note on base_cell().
//
// The shoulders stand off stop_clear/2, the SAME clearance the laser route's
// stop rail uses, so the two routes present the switch with identical
// geometry. They used to sit at mx_cut/2 + 0.5 = 7.5, a 15.0 mm gap, which is
// narrower than the 15.60 mm housing that has to pass down between them.
// They are rooted on the base plate, not on the boss, so they may overhang it.
module mx_boss() {
    boss = mx_cut + 2*3;
    translate([-boss/2, -boss/2, 0]) cube([boss, boss, mx_riser_h]);
    for (s = [-1, 1])
        translate([s > 0 ? stop_clear/2 : -(stop_clear/2 + stop_width),
                   -boss/2, 0])
            cube([stop_width, boss, stop_top - base_th]);
}

// White key MX socket, CUT half. Same frame as mx_boss().
module mx_cuts() { switch_cuts(0); }

// =====================================================================
// Render selector
// =====================================================================
// "full"      the whole 11-key board — the default, so this file and
//             piano_base_laser.scad open showing the SAME view and the two
//             routes can be compared directly. Too big to print.
// "assembly"  one cell + one key + one black key, for checking fit up close
// "base"      one bare base cell
// "tile"      one printable tile -> set tile_i and print all 3
mode   = "assembly";
tile_i = 0;      // which tile to render: 0, 1 or 2. Cells and seam-safety are
                 // set by tile_first / tile_last near the top of this file.

if (mode == "assembly") {
    color("gray")  base_cell(0);
    color("white") key_lever(0);
    // is_black(0) is true, so key 0's black key is its -y neighbour
    color("black") translate([0, -pitch/2, 0]) black_key();
} else if (mode == "base") {
    base_cell(0);
} else if (mode == "tile") {
    // -i*pitch so the tile reads the same way round as the assembled board
    for (i = [tile_first[tile_i] : tile_last[tile_i]])
        translate([0, -(i - tile_first[tile_i]) * pitch, 0]) base_cell(i);
} else if (mode == "full") {
    // Orientation check: reading left to right the black keys must go single,
    // PAIR, TRIPLET, single. Triplet before pair means the camera is behind the
    // board — move the camera, do not edit black_idx.
    //
    // slot_y() mirrors the index so key 0 lands at HIGH y = the viewer's left,
    // matching the simulator. See the orientation note in piano_params.scad.
    for (i = [0 : n_keys - 1]) translate([0, slot_y(i), 0]) {
        color("gray")  base_cell(i);
        color("white") key_lever(i);
    }
    // a black key sits midway between the slots of key b and key b+1
    for (b = black_idx)
        color("black")
            translate([0, (slot_y(b) + slot_y(b + 1)) / 2, 0]) black_key();
}
